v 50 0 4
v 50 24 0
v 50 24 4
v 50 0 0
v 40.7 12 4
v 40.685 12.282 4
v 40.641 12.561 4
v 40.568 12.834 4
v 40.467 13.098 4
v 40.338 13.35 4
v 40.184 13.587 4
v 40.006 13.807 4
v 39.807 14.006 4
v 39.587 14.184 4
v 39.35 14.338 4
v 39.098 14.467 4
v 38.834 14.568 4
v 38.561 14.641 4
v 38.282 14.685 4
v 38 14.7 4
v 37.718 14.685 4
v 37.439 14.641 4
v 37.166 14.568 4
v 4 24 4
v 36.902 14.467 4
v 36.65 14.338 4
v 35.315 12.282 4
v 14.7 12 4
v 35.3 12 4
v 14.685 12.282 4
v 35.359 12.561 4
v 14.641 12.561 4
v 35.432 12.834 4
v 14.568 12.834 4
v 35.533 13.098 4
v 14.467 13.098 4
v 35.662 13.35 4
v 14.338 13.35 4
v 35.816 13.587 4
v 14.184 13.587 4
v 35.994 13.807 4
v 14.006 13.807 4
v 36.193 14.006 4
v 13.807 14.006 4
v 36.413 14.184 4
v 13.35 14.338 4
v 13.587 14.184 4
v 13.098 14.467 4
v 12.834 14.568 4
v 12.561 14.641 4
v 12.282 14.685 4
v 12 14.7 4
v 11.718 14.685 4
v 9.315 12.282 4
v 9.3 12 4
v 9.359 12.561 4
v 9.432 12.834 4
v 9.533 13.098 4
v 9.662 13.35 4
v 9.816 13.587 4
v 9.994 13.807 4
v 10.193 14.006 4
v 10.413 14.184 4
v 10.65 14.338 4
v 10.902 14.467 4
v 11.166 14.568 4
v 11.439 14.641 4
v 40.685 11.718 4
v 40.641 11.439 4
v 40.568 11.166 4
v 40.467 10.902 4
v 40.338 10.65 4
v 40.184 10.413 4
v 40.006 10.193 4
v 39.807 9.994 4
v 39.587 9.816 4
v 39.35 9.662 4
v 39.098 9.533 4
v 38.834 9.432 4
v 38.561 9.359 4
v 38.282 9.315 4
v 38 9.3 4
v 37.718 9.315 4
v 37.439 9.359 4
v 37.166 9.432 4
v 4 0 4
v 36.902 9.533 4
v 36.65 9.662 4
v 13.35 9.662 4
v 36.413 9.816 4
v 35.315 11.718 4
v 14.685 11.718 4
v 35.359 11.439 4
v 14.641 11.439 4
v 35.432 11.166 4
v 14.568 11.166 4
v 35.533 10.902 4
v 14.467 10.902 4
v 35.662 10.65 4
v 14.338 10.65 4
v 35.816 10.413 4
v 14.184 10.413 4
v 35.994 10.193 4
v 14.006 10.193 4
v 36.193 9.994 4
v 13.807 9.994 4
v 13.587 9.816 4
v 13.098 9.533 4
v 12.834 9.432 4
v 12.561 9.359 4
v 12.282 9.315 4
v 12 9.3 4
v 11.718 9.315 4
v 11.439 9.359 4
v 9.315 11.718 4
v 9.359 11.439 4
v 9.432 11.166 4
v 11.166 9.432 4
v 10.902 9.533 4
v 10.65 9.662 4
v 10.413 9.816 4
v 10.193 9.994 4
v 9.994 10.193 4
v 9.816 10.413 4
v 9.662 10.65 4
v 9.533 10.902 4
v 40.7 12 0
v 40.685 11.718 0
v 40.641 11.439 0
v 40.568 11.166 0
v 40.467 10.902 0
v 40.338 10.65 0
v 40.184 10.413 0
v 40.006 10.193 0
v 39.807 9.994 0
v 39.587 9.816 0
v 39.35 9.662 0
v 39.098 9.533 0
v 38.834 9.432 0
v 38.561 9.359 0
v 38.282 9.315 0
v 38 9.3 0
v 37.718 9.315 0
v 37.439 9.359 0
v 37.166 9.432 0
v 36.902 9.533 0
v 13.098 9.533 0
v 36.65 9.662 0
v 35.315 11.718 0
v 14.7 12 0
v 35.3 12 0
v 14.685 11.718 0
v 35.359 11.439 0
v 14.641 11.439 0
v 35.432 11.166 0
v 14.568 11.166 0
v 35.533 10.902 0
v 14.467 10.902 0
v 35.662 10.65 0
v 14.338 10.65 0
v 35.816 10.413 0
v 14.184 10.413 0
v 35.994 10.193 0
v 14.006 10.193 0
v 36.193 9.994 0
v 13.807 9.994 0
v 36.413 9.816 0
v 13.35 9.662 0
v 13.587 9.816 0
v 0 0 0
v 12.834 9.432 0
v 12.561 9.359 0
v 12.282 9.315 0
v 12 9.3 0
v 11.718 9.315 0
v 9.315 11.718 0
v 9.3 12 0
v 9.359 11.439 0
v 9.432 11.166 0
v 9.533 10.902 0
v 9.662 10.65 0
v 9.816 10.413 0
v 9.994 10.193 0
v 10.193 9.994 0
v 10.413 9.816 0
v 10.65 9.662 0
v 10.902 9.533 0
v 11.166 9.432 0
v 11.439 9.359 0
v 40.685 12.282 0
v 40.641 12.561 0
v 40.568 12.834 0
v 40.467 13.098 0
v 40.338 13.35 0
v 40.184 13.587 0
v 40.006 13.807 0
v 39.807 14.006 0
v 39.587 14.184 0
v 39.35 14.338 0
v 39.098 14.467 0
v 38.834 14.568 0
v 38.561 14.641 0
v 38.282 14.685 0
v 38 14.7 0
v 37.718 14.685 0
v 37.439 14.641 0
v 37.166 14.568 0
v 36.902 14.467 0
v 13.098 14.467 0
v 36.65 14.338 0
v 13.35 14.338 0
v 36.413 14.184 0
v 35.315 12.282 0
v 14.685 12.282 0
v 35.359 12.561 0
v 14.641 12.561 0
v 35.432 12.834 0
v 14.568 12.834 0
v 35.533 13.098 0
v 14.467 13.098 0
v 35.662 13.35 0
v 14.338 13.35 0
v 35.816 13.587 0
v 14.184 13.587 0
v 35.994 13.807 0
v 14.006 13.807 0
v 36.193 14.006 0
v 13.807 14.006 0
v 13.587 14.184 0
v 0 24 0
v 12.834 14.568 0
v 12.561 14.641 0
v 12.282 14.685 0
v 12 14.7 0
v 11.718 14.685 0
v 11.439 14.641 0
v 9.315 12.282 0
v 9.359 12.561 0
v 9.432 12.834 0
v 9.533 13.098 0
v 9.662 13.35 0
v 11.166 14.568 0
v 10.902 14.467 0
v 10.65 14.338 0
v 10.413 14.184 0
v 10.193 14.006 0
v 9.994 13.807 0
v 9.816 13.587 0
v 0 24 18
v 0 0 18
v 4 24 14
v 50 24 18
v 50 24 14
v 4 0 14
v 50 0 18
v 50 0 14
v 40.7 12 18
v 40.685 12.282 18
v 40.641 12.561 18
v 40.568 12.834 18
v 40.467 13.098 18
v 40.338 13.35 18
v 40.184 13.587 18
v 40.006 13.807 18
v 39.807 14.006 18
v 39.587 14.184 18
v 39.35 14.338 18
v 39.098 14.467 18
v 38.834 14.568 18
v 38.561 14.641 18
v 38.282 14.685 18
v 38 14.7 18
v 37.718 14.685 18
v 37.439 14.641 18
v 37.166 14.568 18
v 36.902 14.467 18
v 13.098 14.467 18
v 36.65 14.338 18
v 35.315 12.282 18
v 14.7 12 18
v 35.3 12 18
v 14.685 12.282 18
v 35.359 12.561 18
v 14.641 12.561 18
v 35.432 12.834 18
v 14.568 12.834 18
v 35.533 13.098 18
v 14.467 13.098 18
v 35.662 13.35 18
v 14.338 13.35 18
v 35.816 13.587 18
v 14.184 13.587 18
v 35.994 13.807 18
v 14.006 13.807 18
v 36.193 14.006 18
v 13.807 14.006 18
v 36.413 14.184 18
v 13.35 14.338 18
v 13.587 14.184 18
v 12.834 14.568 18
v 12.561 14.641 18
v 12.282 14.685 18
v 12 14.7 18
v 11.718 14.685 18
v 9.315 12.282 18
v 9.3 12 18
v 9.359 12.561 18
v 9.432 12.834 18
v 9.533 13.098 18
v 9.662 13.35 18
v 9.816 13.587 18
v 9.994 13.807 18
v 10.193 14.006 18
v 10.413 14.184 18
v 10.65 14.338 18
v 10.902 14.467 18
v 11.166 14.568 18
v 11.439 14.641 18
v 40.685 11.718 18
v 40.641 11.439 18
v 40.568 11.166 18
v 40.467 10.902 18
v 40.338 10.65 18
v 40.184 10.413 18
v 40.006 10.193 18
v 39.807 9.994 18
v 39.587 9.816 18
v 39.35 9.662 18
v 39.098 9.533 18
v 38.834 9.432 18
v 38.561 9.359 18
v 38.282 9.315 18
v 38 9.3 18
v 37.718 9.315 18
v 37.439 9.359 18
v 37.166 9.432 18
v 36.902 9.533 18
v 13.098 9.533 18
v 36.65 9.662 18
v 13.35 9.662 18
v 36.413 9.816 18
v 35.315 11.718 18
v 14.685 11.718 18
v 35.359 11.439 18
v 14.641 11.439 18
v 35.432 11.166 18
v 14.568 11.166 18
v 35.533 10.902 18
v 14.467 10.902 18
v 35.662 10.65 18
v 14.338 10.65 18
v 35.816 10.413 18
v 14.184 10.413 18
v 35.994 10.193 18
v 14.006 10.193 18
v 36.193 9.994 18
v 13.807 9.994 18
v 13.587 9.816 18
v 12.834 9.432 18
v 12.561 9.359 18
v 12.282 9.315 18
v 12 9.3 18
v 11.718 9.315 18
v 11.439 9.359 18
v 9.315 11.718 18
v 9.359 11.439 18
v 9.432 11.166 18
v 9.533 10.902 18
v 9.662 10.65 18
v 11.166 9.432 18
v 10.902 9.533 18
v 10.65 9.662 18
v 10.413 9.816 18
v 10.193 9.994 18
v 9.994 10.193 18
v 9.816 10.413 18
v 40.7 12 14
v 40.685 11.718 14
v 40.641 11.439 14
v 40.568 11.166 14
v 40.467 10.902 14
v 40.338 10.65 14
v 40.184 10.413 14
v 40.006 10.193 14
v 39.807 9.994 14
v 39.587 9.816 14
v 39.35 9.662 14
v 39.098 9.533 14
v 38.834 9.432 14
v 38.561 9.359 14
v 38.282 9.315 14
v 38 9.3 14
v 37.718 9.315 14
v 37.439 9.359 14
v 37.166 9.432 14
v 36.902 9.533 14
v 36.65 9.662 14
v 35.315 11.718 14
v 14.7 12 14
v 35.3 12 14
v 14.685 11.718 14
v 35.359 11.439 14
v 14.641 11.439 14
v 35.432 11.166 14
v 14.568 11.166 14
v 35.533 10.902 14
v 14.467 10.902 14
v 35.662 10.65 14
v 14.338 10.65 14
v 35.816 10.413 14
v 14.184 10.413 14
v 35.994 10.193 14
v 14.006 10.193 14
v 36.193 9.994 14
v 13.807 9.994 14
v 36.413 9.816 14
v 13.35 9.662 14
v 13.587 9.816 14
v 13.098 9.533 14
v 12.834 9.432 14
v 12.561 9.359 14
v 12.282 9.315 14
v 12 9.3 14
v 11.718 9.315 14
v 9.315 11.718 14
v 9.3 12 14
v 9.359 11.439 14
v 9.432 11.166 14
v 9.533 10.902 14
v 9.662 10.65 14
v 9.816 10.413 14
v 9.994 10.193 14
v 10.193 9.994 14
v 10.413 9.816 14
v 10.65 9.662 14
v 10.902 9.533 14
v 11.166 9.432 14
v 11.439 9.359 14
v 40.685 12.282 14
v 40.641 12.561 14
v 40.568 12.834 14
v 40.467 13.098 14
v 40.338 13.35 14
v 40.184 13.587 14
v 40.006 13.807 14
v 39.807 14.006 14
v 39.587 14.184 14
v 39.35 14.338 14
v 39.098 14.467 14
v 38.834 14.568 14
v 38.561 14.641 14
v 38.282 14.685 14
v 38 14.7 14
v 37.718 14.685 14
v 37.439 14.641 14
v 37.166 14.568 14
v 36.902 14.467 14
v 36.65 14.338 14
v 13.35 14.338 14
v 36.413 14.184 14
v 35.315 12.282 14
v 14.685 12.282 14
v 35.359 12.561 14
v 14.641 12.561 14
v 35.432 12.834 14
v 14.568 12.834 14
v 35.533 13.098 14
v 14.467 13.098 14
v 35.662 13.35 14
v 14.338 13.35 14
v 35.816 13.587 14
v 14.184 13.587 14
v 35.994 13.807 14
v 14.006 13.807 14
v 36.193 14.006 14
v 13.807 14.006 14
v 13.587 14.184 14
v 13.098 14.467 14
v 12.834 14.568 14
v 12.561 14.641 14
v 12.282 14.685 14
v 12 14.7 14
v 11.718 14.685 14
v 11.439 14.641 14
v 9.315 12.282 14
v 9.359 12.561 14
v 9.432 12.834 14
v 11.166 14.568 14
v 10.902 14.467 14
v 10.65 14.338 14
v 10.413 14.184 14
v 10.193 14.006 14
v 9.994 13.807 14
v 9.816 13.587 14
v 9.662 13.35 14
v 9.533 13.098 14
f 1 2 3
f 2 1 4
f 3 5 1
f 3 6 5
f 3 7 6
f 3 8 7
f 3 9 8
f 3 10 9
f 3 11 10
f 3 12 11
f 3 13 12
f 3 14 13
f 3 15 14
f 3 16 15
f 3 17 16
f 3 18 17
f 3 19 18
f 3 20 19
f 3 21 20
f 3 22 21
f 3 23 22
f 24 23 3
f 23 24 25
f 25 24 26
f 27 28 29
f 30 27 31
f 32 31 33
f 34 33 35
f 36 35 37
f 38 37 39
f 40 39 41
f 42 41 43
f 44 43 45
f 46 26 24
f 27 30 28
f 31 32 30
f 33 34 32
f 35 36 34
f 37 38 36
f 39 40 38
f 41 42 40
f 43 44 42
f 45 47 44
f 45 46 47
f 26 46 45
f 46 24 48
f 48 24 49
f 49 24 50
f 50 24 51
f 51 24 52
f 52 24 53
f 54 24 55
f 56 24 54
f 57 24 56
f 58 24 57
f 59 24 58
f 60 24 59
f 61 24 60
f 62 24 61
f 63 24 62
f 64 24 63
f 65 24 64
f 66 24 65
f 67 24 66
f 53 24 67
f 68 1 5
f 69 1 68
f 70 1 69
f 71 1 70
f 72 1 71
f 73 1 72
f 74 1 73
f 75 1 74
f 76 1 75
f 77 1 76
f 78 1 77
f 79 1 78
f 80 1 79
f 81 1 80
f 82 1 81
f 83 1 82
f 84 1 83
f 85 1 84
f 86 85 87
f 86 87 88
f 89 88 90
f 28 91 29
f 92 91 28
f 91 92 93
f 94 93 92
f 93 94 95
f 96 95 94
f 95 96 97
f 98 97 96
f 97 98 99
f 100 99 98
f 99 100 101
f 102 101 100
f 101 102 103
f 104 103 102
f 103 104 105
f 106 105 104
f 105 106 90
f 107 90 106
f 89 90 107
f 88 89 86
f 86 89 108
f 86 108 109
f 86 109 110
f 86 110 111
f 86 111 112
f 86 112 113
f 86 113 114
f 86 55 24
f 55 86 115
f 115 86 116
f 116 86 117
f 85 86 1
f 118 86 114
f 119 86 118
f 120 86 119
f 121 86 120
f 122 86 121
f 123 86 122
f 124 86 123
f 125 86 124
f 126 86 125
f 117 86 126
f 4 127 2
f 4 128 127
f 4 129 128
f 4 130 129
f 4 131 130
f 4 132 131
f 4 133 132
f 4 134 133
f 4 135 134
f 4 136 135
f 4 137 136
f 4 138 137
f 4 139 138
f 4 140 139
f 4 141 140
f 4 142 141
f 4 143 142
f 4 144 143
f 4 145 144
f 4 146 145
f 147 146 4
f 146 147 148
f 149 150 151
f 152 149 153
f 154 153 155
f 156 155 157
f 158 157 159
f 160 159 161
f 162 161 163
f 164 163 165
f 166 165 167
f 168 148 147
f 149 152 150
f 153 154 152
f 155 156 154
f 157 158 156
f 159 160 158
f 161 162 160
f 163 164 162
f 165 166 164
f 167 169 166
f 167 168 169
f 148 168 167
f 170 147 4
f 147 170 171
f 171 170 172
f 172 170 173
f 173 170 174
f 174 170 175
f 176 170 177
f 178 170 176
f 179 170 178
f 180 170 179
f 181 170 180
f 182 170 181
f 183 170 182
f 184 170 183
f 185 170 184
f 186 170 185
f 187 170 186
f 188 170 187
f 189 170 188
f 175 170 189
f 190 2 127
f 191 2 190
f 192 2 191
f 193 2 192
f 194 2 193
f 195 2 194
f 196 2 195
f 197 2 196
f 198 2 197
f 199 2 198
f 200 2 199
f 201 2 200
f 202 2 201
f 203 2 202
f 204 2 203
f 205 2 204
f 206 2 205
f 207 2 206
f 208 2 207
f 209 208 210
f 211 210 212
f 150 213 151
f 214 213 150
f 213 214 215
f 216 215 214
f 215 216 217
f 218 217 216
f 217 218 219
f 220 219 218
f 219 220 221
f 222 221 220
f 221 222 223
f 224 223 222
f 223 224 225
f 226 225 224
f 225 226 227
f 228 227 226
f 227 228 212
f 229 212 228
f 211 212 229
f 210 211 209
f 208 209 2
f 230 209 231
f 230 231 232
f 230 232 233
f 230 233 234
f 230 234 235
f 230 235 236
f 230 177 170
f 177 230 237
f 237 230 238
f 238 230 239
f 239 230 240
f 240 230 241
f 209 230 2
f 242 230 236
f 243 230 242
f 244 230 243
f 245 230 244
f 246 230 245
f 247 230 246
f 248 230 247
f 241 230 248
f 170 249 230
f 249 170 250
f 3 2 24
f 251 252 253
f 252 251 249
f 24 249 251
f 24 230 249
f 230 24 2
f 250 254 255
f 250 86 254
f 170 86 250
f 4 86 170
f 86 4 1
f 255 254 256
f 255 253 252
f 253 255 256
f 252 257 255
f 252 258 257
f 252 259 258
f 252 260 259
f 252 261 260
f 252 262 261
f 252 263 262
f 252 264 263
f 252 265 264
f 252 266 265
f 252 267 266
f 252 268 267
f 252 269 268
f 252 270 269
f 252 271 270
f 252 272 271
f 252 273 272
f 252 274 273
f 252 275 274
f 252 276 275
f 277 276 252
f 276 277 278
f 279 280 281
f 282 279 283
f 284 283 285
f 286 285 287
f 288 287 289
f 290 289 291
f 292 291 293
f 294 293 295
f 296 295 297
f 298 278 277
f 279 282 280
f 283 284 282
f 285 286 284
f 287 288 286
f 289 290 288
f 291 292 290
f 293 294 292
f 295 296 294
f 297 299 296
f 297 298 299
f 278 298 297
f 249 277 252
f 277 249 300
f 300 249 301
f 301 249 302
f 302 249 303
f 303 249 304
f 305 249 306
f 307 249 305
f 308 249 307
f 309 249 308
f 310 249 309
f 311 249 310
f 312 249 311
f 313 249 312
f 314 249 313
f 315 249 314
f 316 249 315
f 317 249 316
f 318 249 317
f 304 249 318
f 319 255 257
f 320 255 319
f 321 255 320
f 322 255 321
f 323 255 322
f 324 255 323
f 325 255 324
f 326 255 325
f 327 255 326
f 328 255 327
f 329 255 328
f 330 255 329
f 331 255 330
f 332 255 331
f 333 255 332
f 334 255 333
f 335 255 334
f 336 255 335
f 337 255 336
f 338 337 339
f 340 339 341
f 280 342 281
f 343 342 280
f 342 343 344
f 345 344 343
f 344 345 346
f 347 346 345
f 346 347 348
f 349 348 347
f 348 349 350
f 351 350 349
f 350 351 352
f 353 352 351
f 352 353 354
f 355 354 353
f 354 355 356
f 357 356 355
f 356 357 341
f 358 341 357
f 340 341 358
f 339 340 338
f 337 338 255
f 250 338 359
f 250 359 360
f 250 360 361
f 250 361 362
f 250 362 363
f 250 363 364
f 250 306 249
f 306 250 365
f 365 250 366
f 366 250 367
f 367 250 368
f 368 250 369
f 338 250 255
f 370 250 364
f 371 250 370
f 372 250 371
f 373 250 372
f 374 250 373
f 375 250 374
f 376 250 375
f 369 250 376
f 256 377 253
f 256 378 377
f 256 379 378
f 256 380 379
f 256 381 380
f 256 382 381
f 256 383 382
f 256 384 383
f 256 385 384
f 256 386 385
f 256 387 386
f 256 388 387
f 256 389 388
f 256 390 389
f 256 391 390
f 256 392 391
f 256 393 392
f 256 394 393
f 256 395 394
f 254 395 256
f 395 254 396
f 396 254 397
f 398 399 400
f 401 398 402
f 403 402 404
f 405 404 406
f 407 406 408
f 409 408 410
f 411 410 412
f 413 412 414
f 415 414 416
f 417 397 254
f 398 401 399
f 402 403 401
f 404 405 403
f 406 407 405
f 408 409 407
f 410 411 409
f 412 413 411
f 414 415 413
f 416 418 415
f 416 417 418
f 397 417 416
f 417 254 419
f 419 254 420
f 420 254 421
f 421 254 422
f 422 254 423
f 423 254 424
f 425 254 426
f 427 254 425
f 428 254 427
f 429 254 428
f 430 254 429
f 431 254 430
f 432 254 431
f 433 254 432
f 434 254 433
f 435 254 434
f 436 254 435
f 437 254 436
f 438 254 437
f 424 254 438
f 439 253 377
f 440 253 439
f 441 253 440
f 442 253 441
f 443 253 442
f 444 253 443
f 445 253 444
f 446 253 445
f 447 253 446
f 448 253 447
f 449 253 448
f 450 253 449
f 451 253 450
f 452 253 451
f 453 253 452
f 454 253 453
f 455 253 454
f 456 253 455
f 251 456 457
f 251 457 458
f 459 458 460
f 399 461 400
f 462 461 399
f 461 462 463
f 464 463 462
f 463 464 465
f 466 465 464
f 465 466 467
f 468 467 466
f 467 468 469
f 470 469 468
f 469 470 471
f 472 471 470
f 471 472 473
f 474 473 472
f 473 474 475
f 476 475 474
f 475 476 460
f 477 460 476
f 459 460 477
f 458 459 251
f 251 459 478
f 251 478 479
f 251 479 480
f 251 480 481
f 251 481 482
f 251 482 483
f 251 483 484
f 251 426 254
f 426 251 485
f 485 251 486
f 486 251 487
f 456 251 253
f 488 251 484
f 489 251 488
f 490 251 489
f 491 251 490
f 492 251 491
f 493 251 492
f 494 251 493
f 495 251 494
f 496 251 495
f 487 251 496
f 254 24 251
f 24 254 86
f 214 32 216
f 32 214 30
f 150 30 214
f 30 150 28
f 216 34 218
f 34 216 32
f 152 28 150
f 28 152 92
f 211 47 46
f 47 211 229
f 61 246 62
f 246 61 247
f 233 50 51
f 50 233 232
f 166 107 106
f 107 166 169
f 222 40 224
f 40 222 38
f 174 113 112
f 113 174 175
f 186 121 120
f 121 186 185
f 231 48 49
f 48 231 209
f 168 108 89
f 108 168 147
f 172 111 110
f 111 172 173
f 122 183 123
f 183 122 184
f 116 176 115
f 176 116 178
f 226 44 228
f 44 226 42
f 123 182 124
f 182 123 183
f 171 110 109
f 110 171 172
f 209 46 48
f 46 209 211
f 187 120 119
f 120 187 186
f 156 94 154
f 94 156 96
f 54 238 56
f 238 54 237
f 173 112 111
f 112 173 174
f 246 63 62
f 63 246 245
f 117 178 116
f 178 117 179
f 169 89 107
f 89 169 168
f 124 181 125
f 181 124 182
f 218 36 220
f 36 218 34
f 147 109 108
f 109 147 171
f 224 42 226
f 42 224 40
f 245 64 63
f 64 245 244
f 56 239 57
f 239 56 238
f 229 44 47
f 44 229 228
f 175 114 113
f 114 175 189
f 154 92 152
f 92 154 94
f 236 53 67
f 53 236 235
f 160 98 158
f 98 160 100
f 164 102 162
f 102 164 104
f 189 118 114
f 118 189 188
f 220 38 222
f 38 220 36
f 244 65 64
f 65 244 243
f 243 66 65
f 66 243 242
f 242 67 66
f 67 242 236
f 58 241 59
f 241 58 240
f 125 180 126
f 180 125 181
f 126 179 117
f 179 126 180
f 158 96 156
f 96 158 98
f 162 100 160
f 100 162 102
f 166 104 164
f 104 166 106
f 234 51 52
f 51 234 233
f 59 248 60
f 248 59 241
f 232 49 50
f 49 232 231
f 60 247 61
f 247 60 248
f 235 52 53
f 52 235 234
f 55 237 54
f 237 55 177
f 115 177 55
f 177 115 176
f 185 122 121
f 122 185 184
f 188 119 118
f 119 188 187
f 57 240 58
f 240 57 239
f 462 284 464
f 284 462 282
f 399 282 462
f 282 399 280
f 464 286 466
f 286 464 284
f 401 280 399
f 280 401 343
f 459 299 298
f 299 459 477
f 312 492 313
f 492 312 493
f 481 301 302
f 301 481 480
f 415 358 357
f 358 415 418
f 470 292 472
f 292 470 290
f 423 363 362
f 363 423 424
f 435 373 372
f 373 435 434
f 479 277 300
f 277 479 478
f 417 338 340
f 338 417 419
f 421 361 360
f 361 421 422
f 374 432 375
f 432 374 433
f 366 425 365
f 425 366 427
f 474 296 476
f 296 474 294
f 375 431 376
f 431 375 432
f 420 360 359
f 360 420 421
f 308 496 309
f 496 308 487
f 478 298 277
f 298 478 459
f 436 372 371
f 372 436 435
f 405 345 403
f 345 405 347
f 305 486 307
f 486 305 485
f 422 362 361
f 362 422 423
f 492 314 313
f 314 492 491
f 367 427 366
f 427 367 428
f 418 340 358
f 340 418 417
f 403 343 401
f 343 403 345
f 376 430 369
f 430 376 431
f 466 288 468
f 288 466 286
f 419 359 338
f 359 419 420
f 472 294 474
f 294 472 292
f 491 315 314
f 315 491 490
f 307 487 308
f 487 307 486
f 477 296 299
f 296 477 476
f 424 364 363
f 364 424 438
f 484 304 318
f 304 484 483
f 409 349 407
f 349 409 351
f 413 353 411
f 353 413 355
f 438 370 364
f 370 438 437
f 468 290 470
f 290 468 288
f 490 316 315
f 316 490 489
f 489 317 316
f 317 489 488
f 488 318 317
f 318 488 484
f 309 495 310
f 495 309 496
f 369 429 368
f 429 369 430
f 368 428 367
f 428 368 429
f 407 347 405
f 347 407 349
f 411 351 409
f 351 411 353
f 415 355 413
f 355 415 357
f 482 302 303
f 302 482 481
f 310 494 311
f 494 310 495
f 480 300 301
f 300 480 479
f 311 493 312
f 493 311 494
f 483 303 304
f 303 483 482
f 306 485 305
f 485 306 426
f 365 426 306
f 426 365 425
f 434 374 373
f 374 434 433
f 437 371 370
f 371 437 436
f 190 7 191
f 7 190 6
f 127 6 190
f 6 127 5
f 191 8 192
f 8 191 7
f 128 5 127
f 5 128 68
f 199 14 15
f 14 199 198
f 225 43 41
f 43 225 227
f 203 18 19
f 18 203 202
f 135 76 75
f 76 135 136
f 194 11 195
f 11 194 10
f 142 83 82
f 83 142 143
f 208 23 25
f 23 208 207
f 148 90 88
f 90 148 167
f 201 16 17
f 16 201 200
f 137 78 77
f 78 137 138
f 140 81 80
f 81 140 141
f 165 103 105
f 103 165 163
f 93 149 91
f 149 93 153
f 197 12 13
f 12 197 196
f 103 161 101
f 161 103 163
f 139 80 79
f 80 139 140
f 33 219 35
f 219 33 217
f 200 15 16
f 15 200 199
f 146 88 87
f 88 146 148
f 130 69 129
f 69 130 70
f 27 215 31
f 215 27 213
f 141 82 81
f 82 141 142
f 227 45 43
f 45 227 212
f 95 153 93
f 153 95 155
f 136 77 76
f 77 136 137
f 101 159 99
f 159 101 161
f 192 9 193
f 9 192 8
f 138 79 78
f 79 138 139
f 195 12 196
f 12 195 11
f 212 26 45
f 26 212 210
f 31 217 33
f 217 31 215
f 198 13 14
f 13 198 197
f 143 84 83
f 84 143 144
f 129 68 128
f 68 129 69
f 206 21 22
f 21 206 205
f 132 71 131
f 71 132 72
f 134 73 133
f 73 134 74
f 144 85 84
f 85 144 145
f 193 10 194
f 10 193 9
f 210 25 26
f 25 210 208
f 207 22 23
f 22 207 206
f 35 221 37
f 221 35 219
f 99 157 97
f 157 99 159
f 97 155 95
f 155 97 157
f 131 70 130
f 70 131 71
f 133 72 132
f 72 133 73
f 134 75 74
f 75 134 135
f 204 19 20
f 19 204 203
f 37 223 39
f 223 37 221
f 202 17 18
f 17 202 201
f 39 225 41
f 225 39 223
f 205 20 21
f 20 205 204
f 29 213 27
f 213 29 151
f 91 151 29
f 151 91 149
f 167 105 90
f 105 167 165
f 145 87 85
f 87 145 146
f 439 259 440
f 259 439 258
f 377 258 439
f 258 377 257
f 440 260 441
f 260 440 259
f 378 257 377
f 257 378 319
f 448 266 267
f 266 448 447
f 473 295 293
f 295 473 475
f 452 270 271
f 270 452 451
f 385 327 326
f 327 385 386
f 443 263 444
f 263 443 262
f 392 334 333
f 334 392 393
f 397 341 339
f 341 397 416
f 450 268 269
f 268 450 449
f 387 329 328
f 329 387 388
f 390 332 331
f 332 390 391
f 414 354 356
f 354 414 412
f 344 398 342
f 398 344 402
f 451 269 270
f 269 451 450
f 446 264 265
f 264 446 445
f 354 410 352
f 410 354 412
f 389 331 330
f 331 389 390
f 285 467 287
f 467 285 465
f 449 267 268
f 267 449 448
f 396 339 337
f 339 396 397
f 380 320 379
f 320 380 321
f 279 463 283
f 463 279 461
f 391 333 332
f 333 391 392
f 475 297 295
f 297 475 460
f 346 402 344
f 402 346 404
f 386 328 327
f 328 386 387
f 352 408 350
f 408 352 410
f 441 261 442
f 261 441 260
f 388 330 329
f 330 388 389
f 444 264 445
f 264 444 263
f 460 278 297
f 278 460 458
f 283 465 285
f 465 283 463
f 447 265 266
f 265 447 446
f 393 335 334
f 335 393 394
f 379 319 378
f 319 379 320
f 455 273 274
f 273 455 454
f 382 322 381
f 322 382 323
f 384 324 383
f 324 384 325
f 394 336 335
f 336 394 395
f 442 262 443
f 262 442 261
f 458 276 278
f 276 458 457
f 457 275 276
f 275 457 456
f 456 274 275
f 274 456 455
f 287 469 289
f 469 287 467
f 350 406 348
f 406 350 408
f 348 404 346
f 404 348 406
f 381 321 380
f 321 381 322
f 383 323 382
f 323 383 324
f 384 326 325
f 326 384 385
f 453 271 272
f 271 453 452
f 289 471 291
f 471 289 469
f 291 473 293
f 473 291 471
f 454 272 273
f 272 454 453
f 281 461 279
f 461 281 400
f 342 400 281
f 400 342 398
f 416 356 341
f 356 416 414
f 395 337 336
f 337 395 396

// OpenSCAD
// Z-offset mounting bracket.
$fn = 60;
eps = 0.02;
length = 50;
height = 14;
width = 24;
thickness = 4;
difference() {
    union() {
        cube([length,width,thickness]);
        translate([0,0,height]) cube([length,width,thickness]);
        translate([0,0,thickness]) cube([thickness,width,height-thickness]);
    }
    for (x=[12,length-12]) {
        translate([x,width/2,-eps]) cylinder(d=5.4,h=thickness+2*eps);
        translate([x,width/2,height-eps]) cylinder(d=5.4,h=thickness+2*eps);
    }
}
